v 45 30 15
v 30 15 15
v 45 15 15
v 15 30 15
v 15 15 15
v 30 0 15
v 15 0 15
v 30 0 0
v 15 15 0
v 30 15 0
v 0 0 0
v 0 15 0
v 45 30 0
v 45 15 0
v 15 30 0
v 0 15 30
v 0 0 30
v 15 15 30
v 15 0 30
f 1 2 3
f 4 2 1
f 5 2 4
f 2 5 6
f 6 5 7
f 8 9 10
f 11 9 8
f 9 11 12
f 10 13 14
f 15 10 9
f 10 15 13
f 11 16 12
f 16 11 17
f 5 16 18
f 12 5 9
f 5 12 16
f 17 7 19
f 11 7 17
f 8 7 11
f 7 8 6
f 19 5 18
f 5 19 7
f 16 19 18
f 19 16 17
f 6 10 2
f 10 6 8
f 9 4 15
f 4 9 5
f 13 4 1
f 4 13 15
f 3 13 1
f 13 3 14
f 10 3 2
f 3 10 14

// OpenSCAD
// Fongo piece 6: Lightning. GPL-3.0; see README.txt.
// All cube positions derive from the canonical catalogue. z points up.
unit = 15; // mm, scale all pieces AND cards together
positions = [[0,0,0],[0,0,1],[1,0,0],[1,1,0],[2,1,0]];
union() { for (p = positions) translate(p * unit) cube([unit, unit, unit]); }
